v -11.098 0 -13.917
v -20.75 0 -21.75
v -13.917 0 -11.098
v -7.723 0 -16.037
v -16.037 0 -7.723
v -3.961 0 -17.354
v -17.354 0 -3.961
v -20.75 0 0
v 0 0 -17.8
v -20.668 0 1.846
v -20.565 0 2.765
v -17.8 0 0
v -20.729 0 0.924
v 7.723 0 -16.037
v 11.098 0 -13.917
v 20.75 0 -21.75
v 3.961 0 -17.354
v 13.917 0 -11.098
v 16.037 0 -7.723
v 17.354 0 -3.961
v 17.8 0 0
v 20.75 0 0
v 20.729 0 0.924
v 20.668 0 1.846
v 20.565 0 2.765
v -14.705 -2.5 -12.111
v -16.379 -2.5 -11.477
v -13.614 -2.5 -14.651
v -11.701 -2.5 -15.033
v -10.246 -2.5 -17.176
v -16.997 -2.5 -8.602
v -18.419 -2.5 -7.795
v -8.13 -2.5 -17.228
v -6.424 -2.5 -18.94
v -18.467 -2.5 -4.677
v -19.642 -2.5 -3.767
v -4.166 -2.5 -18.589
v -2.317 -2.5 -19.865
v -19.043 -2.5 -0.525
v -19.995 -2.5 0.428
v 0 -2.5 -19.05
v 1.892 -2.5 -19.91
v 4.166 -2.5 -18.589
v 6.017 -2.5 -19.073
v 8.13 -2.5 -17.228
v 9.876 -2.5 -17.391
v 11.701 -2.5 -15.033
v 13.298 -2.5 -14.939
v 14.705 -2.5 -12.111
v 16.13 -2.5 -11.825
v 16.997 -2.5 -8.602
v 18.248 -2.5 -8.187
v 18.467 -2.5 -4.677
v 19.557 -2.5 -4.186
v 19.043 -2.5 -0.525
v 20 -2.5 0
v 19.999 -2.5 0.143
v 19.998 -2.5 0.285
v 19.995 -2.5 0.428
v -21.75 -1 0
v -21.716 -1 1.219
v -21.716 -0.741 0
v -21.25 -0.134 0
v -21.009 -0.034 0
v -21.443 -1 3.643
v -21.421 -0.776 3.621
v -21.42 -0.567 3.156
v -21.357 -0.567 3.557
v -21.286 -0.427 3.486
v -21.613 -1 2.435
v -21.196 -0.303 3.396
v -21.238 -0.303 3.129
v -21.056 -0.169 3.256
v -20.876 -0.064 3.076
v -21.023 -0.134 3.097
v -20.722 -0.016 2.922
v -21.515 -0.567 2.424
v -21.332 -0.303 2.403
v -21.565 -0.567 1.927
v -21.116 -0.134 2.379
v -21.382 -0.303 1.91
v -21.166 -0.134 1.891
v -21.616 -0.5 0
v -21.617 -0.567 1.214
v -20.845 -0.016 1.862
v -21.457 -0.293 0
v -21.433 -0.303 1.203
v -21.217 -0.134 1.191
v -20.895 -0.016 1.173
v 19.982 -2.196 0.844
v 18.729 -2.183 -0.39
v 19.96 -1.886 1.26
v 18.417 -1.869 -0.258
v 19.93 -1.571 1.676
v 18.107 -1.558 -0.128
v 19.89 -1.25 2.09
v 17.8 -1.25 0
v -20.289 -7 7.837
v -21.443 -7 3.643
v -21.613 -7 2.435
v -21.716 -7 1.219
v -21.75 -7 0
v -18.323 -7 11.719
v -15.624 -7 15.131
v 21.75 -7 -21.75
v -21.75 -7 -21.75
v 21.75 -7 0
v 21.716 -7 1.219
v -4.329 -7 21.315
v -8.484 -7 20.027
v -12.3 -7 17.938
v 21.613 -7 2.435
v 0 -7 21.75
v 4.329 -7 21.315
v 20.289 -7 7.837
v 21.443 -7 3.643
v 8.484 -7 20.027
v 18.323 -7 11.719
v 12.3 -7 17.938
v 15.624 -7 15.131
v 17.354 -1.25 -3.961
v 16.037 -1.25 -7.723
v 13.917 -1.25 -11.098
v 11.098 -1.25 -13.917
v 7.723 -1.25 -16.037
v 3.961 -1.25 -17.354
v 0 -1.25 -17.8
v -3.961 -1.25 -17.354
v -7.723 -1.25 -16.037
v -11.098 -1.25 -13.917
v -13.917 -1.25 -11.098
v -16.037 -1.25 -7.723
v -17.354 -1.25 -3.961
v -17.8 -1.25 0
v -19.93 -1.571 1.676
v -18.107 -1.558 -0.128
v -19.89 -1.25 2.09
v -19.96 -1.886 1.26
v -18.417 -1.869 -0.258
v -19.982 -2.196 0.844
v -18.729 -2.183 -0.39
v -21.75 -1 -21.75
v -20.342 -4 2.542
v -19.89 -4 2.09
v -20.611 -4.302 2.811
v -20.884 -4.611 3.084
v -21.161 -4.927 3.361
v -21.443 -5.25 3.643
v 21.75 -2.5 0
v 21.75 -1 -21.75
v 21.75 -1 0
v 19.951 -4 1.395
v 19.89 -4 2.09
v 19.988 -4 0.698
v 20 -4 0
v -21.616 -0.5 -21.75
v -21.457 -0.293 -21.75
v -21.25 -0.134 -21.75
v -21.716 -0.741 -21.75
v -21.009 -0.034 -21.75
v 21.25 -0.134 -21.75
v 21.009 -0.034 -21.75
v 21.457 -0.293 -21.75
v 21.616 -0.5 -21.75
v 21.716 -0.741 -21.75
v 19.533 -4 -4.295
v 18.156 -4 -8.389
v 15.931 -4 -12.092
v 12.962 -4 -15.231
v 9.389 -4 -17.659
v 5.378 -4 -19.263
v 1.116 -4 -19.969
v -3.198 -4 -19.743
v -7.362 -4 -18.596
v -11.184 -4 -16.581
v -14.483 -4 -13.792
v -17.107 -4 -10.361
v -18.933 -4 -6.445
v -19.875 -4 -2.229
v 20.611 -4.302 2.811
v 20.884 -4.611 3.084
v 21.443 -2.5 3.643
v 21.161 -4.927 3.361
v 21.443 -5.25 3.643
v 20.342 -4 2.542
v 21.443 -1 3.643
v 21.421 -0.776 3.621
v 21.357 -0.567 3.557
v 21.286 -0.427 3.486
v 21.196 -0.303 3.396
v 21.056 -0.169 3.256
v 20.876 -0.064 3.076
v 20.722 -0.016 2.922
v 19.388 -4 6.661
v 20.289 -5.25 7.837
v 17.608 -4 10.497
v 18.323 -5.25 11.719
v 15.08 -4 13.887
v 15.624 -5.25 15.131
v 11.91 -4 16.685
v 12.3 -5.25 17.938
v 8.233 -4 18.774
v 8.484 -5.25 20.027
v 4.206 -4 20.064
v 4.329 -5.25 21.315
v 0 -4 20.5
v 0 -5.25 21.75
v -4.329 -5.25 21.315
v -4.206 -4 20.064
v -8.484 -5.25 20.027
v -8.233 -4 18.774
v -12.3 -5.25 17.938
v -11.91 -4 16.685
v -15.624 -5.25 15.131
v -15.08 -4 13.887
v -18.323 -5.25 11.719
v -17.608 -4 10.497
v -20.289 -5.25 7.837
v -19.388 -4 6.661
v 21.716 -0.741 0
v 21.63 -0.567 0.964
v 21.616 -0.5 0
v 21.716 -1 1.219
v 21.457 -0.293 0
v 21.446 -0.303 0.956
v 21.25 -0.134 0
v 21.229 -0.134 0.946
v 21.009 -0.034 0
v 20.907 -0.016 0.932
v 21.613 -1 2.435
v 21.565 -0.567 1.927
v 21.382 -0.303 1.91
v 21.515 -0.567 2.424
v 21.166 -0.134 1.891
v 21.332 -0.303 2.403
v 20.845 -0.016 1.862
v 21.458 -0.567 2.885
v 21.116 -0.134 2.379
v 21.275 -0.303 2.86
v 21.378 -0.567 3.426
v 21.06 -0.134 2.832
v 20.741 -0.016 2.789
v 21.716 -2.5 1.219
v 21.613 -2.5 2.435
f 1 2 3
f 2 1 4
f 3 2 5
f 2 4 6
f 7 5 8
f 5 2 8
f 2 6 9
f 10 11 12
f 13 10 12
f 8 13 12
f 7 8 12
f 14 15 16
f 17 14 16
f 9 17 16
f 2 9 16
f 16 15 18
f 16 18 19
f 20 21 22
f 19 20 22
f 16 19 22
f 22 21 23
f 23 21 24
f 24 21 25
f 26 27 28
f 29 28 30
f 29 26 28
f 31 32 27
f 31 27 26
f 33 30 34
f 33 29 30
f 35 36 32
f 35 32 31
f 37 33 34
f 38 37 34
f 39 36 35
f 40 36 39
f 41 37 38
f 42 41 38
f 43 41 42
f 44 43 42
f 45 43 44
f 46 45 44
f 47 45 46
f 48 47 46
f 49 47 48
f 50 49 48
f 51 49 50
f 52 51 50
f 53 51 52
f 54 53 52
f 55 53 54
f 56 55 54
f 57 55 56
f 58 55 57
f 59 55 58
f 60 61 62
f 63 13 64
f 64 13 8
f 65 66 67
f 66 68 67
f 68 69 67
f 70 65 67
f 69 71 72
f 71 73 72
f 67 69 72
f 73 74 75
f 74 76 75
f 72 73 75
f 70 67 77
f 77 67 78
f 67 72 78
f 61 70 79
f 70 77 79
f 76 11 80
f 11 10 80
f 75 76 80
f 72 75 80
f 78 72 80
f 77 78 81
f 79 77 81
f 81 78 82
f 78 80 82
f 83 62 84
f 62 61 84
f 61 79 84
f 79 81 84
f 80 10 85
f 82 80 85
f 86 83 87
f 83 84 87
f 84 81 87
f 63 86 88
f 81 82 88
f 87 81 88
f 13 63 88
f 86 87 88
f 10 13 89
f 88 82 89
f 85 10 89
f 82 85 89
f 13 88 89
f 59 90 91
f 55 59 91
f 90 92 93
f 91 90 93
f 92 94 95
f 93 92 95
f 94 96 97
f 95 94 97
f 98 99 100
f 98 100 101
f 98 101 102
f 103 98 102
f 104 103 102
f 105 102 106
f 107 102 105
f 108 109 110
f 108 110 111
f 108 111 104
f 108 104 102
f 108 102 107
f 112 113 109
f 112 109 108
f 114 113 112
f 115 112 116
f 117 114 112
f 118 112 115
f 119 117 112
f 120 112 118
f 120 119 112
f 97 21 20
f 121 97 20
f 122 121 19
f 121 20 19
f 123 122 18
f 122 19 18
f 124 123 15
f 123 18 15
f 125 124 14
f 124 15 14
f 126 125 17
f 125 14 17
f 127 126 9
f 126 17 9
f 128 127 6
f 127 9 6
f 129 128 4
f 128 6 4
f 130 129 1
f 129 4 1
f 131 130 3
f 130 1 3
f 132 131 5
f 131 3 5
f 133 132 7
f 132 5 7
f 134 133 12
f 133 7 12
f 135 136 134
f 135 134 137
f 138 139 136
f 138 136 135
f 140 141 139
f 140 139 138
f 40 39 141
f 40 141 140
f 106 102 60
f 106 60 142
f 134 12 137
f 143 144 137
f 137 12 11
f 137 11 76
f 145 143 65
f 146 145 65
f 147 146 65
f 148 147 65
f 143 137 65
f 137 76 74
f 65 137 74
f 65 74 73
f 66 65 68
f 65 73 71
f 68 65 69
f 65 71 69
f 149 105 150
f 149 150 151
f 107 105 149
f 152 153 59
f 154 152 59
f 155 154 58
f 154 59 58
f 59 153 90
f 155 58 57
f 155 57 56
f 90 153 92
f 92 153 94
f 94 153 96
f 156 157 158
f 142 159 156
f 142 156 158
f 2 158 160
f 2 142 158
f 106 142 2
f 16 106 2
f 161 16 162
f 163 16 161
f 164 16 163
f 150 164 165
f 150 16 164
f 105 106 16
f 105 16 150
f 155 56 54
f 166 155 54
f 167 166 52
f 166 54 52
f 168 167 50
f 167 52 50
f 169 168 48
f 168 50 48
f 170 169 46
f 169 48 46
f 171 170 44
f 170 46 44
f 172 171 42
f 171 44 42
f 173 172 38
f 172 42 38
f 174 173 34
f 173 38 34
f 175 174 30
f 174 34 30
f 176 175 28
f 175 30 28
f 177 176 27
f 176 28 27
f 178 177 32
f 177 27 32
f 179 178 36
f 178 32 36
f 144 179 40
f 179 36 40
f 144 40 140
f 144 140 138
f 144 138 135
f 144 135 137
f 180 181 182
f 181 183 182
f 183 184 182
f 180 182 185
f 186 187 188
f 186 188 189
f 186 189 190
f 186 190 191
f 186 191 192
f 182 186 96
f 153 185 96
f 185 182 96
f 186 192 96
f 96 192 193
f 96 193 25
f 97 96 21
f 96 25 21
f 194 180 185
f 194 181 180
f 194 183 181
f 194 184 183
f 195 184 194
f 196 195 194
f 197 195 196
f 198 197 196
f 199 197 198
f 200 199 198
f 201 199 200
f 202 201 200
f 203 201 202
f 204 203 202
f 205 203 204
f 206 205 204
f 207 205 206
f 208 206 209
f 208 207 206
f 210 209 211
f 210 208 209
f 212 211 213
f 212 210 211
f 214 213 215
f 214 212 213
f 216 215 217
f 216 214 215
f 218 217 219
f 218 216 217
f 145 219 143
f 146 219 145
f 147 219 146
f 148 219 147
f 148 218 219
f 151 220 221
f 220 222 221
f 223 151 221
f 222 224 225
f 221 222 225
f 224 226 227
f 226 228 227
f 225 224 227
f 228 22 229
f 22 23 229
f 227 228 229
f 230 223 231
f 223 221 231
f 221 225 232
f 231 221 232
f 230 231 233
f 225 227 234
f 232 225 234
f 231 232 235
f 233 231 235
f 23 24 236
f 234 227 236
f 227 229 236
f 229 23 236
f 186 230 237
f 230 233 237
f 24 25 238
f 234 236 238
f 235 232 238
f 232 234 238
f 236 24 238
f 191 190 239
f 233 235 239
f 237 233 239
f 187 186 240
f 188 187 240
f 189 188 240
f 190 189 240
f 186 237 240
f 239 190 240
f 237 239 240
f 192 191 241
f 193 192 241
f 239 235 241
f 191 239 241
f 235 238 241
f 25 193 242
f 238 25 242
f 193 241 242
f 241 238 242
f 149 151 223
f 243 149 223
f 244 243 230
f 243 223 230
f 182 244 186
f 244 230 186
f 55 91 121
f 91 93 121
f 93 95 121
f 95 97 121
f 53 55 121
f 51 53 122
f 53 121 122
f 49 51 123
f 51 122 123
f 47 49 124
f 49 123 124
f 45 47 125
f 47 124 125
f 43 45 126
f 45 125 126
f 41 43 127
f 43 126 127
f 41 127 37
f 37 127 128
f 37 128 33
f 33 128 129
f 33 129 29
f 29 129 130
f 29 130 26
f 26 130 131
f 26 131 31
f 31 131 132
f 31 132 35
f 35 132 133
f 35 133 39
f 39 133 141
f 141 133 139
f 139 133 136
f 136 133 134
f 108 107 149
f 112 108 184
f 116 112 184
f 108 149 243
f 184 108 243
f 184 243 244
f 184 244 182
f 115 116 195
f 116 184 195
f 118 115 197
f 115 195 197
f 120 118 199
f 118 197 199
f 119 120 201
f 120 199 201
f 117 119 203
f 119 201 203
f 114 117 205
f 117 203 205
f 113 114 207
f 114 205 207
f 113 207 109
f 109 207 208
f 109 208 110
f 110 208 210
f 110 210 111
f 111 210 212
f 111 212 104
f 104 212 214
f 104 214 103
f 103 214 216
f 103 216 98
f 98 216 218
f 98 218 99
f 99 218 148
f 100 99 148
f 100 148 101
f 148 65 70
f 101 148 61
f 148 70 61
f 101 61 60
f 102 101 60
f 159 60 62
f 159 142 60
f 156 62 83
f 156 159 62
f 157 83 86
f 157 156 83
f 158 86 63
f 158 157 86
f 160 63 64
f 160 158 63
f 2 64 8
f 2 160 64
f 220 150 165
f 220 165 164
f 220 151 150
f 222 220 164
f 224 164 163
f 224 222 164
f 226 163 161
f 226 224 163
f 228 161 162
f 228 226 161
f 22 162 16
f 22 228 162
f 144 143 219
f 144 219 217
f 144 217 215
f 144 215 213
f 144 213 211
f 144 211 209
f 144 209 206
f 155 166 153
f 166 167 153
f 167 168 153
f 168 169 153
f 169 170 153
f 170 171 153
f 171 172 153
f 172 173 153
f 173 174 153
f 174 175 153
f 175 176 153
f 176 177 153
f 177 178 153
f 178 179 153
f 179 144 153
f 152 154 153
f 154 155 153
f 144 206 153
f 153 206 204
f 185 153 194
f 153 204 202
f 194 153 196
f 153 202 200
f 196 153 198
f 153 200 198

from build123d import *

# Parameters (mm, degrees)
F1_DEPTH = 2.5
F3_DEPTH = 1.5
F5_DEPTH = 3
F7_DEPTH = 7
F8_SIZE  = 1.25
F9_R     = 1


with BuildPart() as f1:
    # F0 (on Front) → F1 (new body)
    with BuildSketch(Plane.XZ):
        with BuildLine():
            ThreePointArc((17.8, 0), (0, -17.8), (-17.8, 0))
            Line((-17.8, 0), (-21.4427768058, 3.6427768058))
            ThreePointArc((-21.4427768058, 3.6427768058), (0, -21.75), (21.4427768058, 3.6427768058))
            Line((21.4427768058, 3.6427768058), (17.8, 0))
        make_face()
    extrude(amount=F1_DEPTH)

    # F2 (on face) → F3 (join)
    with BuildSketch(Plane.XZ.offset(2.5)):
        with BuildLine():
            ThreePointArc((-21.4427768058, 3.6427768058), (-1.8278545448, -21.6730581082), (21.75, 0))
            ThreePointArc((21.75, 0), (21.6730581082, 1.8278545448), (21.4427768058, 3.6427768058))
            Line((21.4427768058, 3.6427768058), (19.8904504002, 2.0904504002))
            ThreePointArc((19.8904504002, 2.0904504002), (19.9725938226, 1.0466594468), (20, 0))
            ThreePointArc((20, 0), (-1.0466594468, -19.9725938226), (-19.8904504002, 2.0904504002))
            Line((-19.8904504002, 2.0904504002), (-21.4427768058, 3.6427768058))
        make_face()
    extrude(amount=F3_DEPTH)

    # F4 (on face) → F5 (join)
    with BuildSketch(Plane.XZ.offset(4)):
        with BuildLine():
            ThreePointArc((-21.4427768058, 3.6427768058), (-1.8278545448, -21.6730581082), (21.75, 0))
            ThreePointArc((21.75, 0), (21.6730581082, 1.8278545448), (21.4427768058, 3.6427768058))
            Line((21.4427768058, 3.6427768058), (19.8904504002, 2.0904504002))
            ThreePointArc((19.8904504002, 2.0904504002), (0, -20), (-19.8904504002, 2.0904504002))
            Line((-19.8904504002, 2.0904504002), (-21.4427768058, 3.6427768058))
        make_face()
        with BuildLine():
            Line((19.8904504002, 2.0904504002), (21.4427768058, 3.6427768058))
            ThreePointArc((21.4427768058, 3.6427768058), (0, 21.75), (-21.4427768058, 3.6427768058))
            Line((-21.4427768058, 3.6427768058), (-19.8904504002, 2.0904504002))
            ThreePointArc((-19.8904504002, 2.0904504002), (0, -20), (19.8904504002, 2.0904504002))
        make_face()
    extrude(amount=F5_DEPTH)

    # F6 (on face) → F7 (join, through all)
    with BuildSketch(Plane.XZ.offset(7)):
        with BuildLine():
            ThreePointArc((-6.4e-09, -21.75), (-15.3795724931, -15.3795724885), (-21.75, 0))
            Line((-21.75, 0), (-21.75, -21.75))
            Line((-21.75, -21.75), (-6.4e-09, -21.75))
        make_face()
        with BuildLine():
            Line((21.75, -21.75), (21.75, 0))
            ThreePointArc((21.75, 0), (15.3795724885, -15.3795724931), (-6.4e-09, -21.75))
            Line((-6.4e-09, -21.75), (21.75, -21.75))
        make_face()
    extrude(amount=-F7_DEPTH)

    # F8
    f8_edges = [f1.edges().sort_by_distance(p)[0] for p in [
        (0, -4, 21.75),
        (18.845225, -2.5, 1.045225),
        (0, -2.5, -17.8),
        (-18.845225, -2.5, 1.045225),
    ]]
    chamfer(f8_edges, length=F8_SIZE)

    # F9
    f9_edges = [f1.edges().sort_by_distance(p)[0] for p in [
        (21.75, 0, -10.875),
        (-21.75, 0, -10.875),
    ]]
    fillet(f9_edges, radius=F9_R)


solid = f1.part
